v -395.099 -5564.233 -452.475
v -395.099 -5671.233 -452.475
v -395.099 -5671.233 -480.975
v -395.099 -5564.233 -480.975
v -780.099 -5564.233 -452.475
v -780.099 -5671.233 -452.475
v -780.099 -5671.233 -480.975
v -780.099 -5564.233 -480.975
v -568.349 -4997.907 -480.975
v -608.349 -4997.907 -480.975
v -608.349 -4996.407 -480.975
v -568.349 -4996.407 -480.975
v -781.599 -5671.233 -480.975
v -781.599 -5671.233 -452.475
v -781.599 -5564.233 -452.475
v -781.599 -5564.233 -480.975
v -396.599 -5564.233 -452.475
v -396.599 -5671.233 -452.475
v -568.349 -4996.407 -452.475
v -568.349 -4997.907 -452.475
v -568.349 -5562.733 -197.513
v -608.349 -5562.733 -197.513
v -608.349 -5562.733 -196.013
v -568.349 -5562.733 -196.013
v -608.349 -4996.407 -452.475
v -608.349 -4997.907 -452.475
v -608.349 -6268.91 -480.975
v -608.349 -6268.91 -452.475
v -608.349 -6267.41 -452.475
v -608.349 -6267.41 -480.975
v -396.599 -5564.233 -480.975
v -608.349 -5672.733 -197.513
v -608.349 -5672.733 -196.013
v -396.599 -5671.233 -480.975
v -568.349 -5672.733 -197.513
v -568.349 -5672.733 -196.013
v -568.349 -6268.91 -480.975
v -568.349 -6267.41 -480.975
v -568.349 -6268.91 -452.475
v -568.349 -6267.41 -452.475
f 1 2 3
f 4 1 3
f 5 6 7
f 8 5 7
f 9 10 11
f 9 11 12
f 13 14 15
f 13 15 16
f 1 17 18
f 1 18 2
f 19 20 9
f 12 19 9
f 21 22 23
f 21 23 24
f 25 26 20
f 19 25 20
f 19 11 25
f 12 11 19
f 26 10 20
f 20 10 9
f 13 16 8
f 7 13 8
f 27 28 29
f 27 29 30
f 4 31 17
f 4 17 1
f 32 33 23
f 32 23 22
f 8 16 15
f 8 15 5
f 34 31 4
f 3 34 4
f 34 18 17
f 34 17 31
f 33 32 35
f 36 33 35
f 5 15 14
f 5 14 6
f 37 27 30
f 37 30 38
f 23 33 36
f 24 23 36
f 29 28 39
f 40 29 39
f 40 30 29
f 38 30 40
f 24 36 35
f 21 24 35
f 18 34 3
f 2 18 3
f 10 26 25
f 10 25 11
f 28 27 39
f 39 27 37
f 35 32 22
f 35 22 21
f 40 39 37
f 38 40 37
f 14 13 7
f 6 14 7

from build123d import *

# Parameters (mm, degrees)
SKETCH1_W            = 400
SKETCH1_H            = 300
BOSS_EXTRUDE1_DEPTH  = 1100
SHELL1_T             = -15
SPLIT2_START         = -6167.732568069
SPLIT2_OUTLINE_W     = 15
SPLIT2_OUTLINE_H     = 285
SPLIT2_DEPTH         = 1100
SPLIT2_2_OUTLINE_W   = 385
SPLIT2_2_OUTLINE_H   = 285
SPLIT2_2_DEPTH       = 15
SPLIT2_START_2       = -5082.732568069
SPLIT2_3_OUTLINE_W   = 385
SPLIT2_3_OUTLINE_H   = 285
SPLIT2_3_DEPTH       = 15
SPLIT2_START_3       = -6152.732568069
SPLIT2_4_OUTLINE_W   = 15
SPLIT2_4_OUTLINE_H   = 285
SPLIT2_4_DEPTH       = 1070
SPLIT2_5_OUTLINE_W   = 400
SPLIT2_5_OUTLINE_H   = 285
SPLIT2_5_DEPTH       = 15
SPLIT2_6_OUTLINE_W   = 400
SPLIT2_6_OUTLINE_H   = 285
SPLIT2_6_DEPTH       = 15
SCALE1_START         = -6275.660190895
SCALE1_OUTLINE_W     = 400
SCALE1_OUTLINE_H     = 285
SCALE1_OUTLINE_W_2   = 40
SCALE1_OUTLINE_H_2   = 28.5
SCALE1_OUTLINE_W_3   = 1.5
SCALE1_OUTLINE_H_3   = 15
SCALE1_OUTLINE_H_4   = 1.5
SCALE1_DEPTH         = 1286.002924444
SCALE1_START_2       = -6267.410190895
SCALE1_2_OUTLINE_W   = 1.5
SCALE1_2_OUTLINE_H   = 28.5
SCALE1_2_OUTLINE_W_2 = 40
SCALE1_2_OUTLINE_H_2 = 1.5
SCALE1_2_DEPTH       = 594.677622826
SCALE1_START_3       = -5562.732568069
SCALE1_3_OUTLINE_W   = 1.5
SCALE1_3_OUTLINE_H   = 28.5
SCALE1_3_OUTLINE_W_2 = 40
SCALE1_3_OUTLINE_H_2 = 1.5
SCALE1_3_DEPTH       = 564.825301618
SCALE1_4_OUTLINE_W   = 1.5
SCALE1_4_OUTLINE_H   = 28.5
SCALE1_4_OUTLINE_W_2 = 40
SCALE1_4_DEPTH       = 6.75
SCALE1_START_4       = -4996.407266451
SCALE1_5_OUTLINE_W   = 1.5
SCALE1_5_OUTLINE_H   = 28.5
SCALE1_5_OUTLINE_W_2 = 40
SCALE1_5_DEPTH       = 6.75
SCALE1_START_5       = -6268.910190895
SCALE1_6_OUTLINE_W   = 1.5
SCALE1_6_OUTLINE_H   = 28.5
SCALE1_6_DEPTH       = 597.677622826
SCALE1_START_6       = -5564.232568069
SCALE1_7_OUTLINE_W   = 1.5
SCALE1_7_OUTLINE_H   = 28.5
SCALE1_7_DEPTH       = 567.825301618


# Read off the part's stored shape, not the designer's step: Split2, Scale1
with BuildPart() as part:
    # Sketch1 → Boss-Extrude1 (new body)
    with BuildSketch(Plane(origin=(0, -6167.732568069, 0), x_dir=(1, 0, 0), z_dir=(0, 1, 0))):
        with Locations((-588.349422114, 459.224669701)):
            Rectangle(SKETCH1_W, SKETCH1_H)
    extrude(amount=BOSS_EXTRUDE1_DEPTH)

    # Shell1
    shell1_openings = [part.faces().sort_by_distance(p)[0] for p in [
        (-588.349422114, -5617.732568069, -609.224669701),
    ]]
    offset(amount=SHELL1_T, openings=shell1_openings, kind=Kind.INTERSECTION)


with BuildPart() as body_2:
    # Split1: the piece on the far side of the plane
    add(part.part)
    split(bisect_by=Plane(origin=(0, 0, -324.224669701), x_dir=(-1, 0, 0), z_dir=(0, 0, -1)), keep=Keep.BOTTOM)


with BuildPart() as part_1:
    add(part.part)

    # Split1
    split(bisect_by=Plane(origin=(0, 0, -324.224669701), x_dir=(-1, 0, 0), z_dir=(0, 0, -1)), keep=Keep.TOP)

    # Split2 outline → Split2 (cut)
    with BuildSketch(Plane(origin=(0, 0, 0), x_dir=(1, 0, 0), z_dir=(0, 1, 0)).offset(SPLIT2_START)):
        with Locations((-395.849422114, 466.724669701)):
            Rectangle(SPLIT2_OUTLINE_W, SPLIT2_OUTLINE_H)
    extrude(amount=SPLIT2_DEPTH, mode=Mode.SUBTRACT)

    # Split2 2 outline → Split2 2 (cut)
    with BuildSketch(Plane(origin=(0, 0, 0), x_dir=(1, 0, 0), z_dir=(0, 1, 0)).offset(SPLIT2_START)):
        with Locations((-595.849422114, 466.724669701)):
            Rectangle(SPLIT2_2_OUTLINE_W, SPLIT2_2_OUTLINE_H)
    extrude(amount=SPLIT2_2_DEPTH, mode=Mode.SUBTRACT)

    # Split2 3 outline → Split2 3 (cut)
    with BuildSketch(Plane(origin=(0, 0, 0), x_dir=(1, 0, 0), z_dir=(0, 1, 0)).offset(SPLIT2_START_2)):
        with Locations((-595.849422114, 466.724669701)):
            Rectangle(SPLIT2_3_OUTLINE_W, SPLIT2_3_OUTLINE_H)
    extrude(amount=SPLIT2_3_DEPTH, mode=Mode.SUBTRACT)


with BuildPart() as body_3:
    # Split2 4 outline → Split2 4 (new body)
    with BuildSketch(Plane(origin=(0, 0, 0), x_dir=(1, 0, 0), z_dir=(0, 1, 0)).offset(SPLIT2_START_3)):
        with Locations((-395.849422114, 466.724669701)):
            Rectangle(SPLIT2_4_OUTLINE_W, SPLIT2_4_OUTLINE_H)
    extrude(amount=SPLIT2_4_DEPTH)


with BuildPart() as body_4:
    # Split2 5 outline → Split2 5 (new body)
    with BuildSketch(Plane(origin=(0, 0, 0), x_dir=(1, 0, 0), z_dir=(0, 1, 0)).offset(SPLIT2_START)):
        with Locations((-588.349422114, 466.724669701)):
            Rectangle(SPLIT2_5_OUTLINE_W, SPLIT2_5_OUTLINE_H)
    extrude(amount=SPLIT2_5_DEPTH)


with BuildPart() as body_5:
    # Split2 6 outline → Split2 6 (new body)
    with BuildSketch(Plane(origin=(0, 0, 0), x_dir=(1, 0, 0), z_dir=(0, 1, 0)).offset(SPLIT2_START_2)):
        with Locations((-588.349422114, 466.724669701)):
            Rectangle(SPLIT2_6_OUTLINE_W, SPLIT2_6_OUTLINE_H)
    extrude(amount=SPLIT2_6_DEPTH)


with BuildPart() as body_2_1:
    # Body-Move/Copy1: moved
    add(body_2.part.moved(Location((0, 0, 119.961763837))))


with BuildPart() as body_5_1:
    # Body-Move/Copy2: moved
    add(body_5.part.moved(Location((0, 78.075301619, 0))))


with BuildPart() as body_4_1:
    # Body-Move/Copy3: moved
    add(body_4.part.moved(Location((0, -107.927622826, 0))))


with BuildPart() as scale1_tool:
    # Scale1 outline → Scale1 (new body)
    # profile 1 of 2: a face of its own
    with BuildSketch(Plane(origin=(0, 0, 0), x_dir=(1, 0, 0), z_dir=(0, 1, 0)).offset(SCALE1_START)):
        with Locations((-588.349422114, 466.724669701)):
            Rectangle(SCALE1_OUTLINE_W, SCALE1_OUTLINE_H)
        with Locations((-588.349422114, 466.724669701)):
            Rectangle(SCALE1_OUTLINE_W_2, SCALE1_OUTLINE_H_2, mode=Mode.SUBTRACT)
        with Locations((-780.849422114, 466.724669701)):
            Rectangle(SCALE1_OUTLINE_W_3, SCALE1_OUTLINE_H_2, mode=Mode.SUBTRACT)
        with Locations((-395.849422114, 466.724669701)):
            Rectangle(SCALE1_OUTLINE_W_3, SCALE1_OUTLINE_H_2, mode=Mode.SUBTRACT)
    # profile 2 of 2: a face of its own
    with BuildSketch(Plane(origin=(0, 0, 0), x_dir=(1, 0, 0), z_dir=(0, 1, 0)).offset(SCALE1_START)):
        with Locations((-588.349422114, 196.762905865)):
            Rectangle(SCALE1_OUTLINE_W, SCALE1_OUTLINE_H_3)
        with Locations((-588.349422114, 196.762905865)):
            Rectangle(SCALE1_OUTLINE_W_2, SCALE1_OUTLINE_H_4, mode=Mode.SUBTRACT)
    extrude(amount=SCALE1_DEPTH)


with BuildPart() as part_2:
    add(part_1.part)

    # Scale1: cut by scale1_tool
    add(scale1_tool.part, mode=Mode.SUBTRACT)


with BuildPart() as body_2_2:
    add(body_2_1.part)

    # Scale1: cut by scale1_tool
    add(scale1_tool.part, mode=Mode.SUBTRACT)


with BuildPart() as body_3_1:
    add(body_3.part)

    # Scale1: cut by scale1_tool
    add(scale1_tool.part, mode=Mode.SUBTRACT)


with BuildPart() as body_4_2:
    add(body_4_1.part)

    # Scale1: cut by scale1_tool
    add(scale1_tool.part, mode=Mode.SUBTRACT)


with BuildPart() as body_5_2:
    add(body_5_1.part)

    # Scale1: cut by scale1_tool
    add(scale1_tool.part, mode=Mode.SUBTRACT)


with BuildPart() as scale1_2_tool:
    # Scale1 2 outline → Scale1 2 (new body)
    with BuildSketch(Plane(origin=(0, 0, 0), x_dir=(1, 0, 0), z_dir=(0, 1, 0)).offset(SCALE1_START_2)):
        with Locations((-780.849422114, 466.724669701)):
            Rectangle(SCALE1_2_OUTLINE_W, SCALE1_2_OUTLINE_H)
        with Locations((-395.849422114, 466.724669701)):
            Rectangle(SCALE1_2_OUTLINE_W, SCALE1_2_OUTLINE_H)
        with Locations((-588.349422114, 466.724669701)):
            Rectangle(SCALE1_2_OUTLINE_W_2, SCALE1_2_OUTLINE_H)
        with Locations((-588.349422114, 196.762905865)):
            Rectangle(SCALE1_2_OUTLINE_W_2, SCALE1_2_OUTLINE_H_2)
    extrude(amount=SCALE1_2_DEPTH)


with BuildPart() as part_3:
    add(part_2.part)

    # Scale1 2: cut by scale1_2_tool
    add(scale1_2_tool.part, mode=Mode.SUBTRACT)


with BuildPart() as body_2_3:
    add(body_2_2.part)

    # Scale1 2: cut by scale1_2_tool
    add(scale1_2_tool.part, mode=Mode.SUBTRACT)


with BuildPart() as body_3_2:
    add(body_3_1.part)

    # Scale1 2: cut by scale1_2_tool
    add(scale1_2_tool.part, mode=Mode.SUBTRACT)


with BuildPart() as body_4_3:
    add(body_4_2.part)

    # Scale1 2: cut by scale1_2_tool
    add(scale1_2_tool.part, mode=Mode.SUBTRACT)

    # Scale1 4 outline → Scale1 4 (cut)
    with BuildSketch(Plane(origin=(0, 0, 0), x_dir=(1, 0, 0), z_dir=(0, 1, 0)).offset(SCALE1_START)):
        with Locations((-780.849422114, 466.724669701)):
            Rectangle(SCALE1_4_OUTLINE_W, SCALE1_4_OUTLINE_H)
        with Locations((-395.849422114, 466.724669701)):
            Rectangle(SCALE1_4_OUTLINE_W, SCALE1_4_OUTLINE_H)
        with Locations((-588.349422114, 466.724669701)):
            Rectangle(SCALE1_4_OUTLINE_W_2, SCALE1_4_OUTLINE_H)
    extrude(amount=SCALE1_4_DEPTH, mode=Mode.SUBTRACT)


with BuildPart() as scale1_3_tool:
    # Scale1 3 outline → Scale1 3 (new body)
    with BuildSketch(Plane(origin=(0, 0, 0), x_dir=(1, 0, 0), z_dir=(0, 1, 0)).offset(SCALE1_START_3)):
        with Locations((-780.849422114, 466.724669701)):
            Rectangle(SCALE1_3_OUTLINE_W, SCALE1_3_OUTLINE_H)
        with Locations((-395.849422114, 466.724669701)):
            Rectangle(SCALE1_3_OUTLINE_W, SCALE1_3_OUTLINE_H)
        with Locations((-588.349422114, 466.724669701)):
            Rectangle(SCALE1_3_OUTLINE_W_2, SCALE1_3_OUTLINE_H)
        with Locations((-588.349422114, 196.762905865)):
            Rectangle(SCALE1_3_OUTLINE_W_2, SCALE1_3_OUTLINE_H_2)
    extrude(amount=SCALE1_3_DEPTH)


with BuildPart() as part_4:
    add(part_3.part)

    # Scale1 3: cut by scale1_3_tool
    add(scale1_3_tool.part, mode=Mode.SUBTRACT)


with BuildPart() as body_2_4:
    add(body_2_3.part)

    # Scale1 3: cut by scale1_3_tool
    add(scale1_3_tool.part, mode=Mode.SUBTRACT)


with BuildPart() as body_3_3:
    add(body_3_2.part)

    # Scale1 3: cut by scale1_3_tool
    add(scale1_3_tool.part, mode=Mode.SUBTRACT)


with BuildPart() as body_5_3:
    add(body_5_2.part)

    # Scale1 3: cut by scale1_3_tool
    add(scale1_3_tool.part, mode=Mode.SUBTRACT)

    # Scale1 5 outline → Scale1 5 (cut)
    with BuildSketch(Plane(origin=(0, 0, 0), x_dir=(1, 0, 0), z_dir=(0, 1, 0)).offset(SCALE1_START_4)):
        with Locations((-780.849422114, 466.724669701)):
            Rectangle(SCALE1_5_OUTLINE_W, SCALE1_5_OUTLINE_H)
        with Locations((-395.849422114, 466.724669701)):
            Rectangle(SCALE1_5_OUTLINE_W, SCALE1_5_OUTLINE_H)
        with Locations((-588.349422114, 466.724669701)):
            Rectangle(SCALE1_5_OUTLINE_W_2, SCALE1_5_OUTLINE_H)
    extrude(amount=SCALE1_5_DEPTH, mode=Mode.SUBTRACT)


with BuildPart() as scale1_6_tool:
    # Scale1 6 outline → Scale1 6 (new body)
    with BuildSketch(Plane(origin=(0, 0, 0), x_dir=(1, 0, 0), z_dir=(0, 1, 0)).offset(SCALE1_START_5)):
        with Locations((-780.849422114, 466.724669701)):
            Rectangle(SCALE1_6_OUTLINE_W, SCALE1_6_OUTLINE_H)
        with Locations((-395.849422114, 466.724669701)):
            Rectangle(SCALE1_6_OUTLINE_W, SCALE1_6_OUTLINE_H)
    extrude(amount=SCALE1_6_DEPTH)


with BuildPart() as part_5:
    add(part_4.part)

    # Scale1 6: cut by scale1_6_tool
    add(scale1_6_tool.part, mode=Mode.SUBTRACT)


with BuildPart() as body_3_4:
    add(body_3_3.part)

    # Scale1 6: cut by scale1_6_tool
    add(scale1_6_tool.part, mode=Mode.SUBTRACT)


with BuildPart() as body_4_4:
    add(body_4_3.part)

    # Scale1 6: cut by scale1_6_tool
    add(scale1_6_tool.part, mode=Mode.SUBTRACT)


with BuildPart() as scale1_7_tool:
    # Scale1 7 outline → Scale1 7 (new body)
    with BuildSketch(Plane(origin=(0, 0, 0), x_dir=(1, 0, 0), z_dir=(0, 1, 0)).offset(SCALE1_START_6)):
        with Locations((-780.849422114, 466.724669701)):
            Rectangle(SCALE1_7_OUTLINE_W, SCALE1_7_OUTLINE_H)
        with Locations((-395.849422114, 466.724669701)):
            Rectangle(SCALE1_7_OUTLINE_W, SCALE1_7_OUTLINE_H)
    extrude(amount=SCALE1_7_DEPTH)


with BuildPart() as part_6:
    add(part_5.part)

    # Scale1 7: cut by scale1_7_tool
    add(scale1_7_tool.part, mode=Mode.SUBTRACT)


with BuildPart() as body_3_5:
    add(body_3_4.part)

    # Scale1 7: cut by scale1_7_tool
    add(scale1_7_tool.part, mode=Mode.SUBTRACT)


with BuildPart() as body_5_4:
    add(body_5_3.part)

    # Scale1 7: cut by scale1_7_tool
    add(scale1_7_tool.part, mode=Mode.SUBTRACT)


solid = Compound([body_2_4.part, body_4_4.part, part_6.part, body_3_5.part, body_5_4.part])
